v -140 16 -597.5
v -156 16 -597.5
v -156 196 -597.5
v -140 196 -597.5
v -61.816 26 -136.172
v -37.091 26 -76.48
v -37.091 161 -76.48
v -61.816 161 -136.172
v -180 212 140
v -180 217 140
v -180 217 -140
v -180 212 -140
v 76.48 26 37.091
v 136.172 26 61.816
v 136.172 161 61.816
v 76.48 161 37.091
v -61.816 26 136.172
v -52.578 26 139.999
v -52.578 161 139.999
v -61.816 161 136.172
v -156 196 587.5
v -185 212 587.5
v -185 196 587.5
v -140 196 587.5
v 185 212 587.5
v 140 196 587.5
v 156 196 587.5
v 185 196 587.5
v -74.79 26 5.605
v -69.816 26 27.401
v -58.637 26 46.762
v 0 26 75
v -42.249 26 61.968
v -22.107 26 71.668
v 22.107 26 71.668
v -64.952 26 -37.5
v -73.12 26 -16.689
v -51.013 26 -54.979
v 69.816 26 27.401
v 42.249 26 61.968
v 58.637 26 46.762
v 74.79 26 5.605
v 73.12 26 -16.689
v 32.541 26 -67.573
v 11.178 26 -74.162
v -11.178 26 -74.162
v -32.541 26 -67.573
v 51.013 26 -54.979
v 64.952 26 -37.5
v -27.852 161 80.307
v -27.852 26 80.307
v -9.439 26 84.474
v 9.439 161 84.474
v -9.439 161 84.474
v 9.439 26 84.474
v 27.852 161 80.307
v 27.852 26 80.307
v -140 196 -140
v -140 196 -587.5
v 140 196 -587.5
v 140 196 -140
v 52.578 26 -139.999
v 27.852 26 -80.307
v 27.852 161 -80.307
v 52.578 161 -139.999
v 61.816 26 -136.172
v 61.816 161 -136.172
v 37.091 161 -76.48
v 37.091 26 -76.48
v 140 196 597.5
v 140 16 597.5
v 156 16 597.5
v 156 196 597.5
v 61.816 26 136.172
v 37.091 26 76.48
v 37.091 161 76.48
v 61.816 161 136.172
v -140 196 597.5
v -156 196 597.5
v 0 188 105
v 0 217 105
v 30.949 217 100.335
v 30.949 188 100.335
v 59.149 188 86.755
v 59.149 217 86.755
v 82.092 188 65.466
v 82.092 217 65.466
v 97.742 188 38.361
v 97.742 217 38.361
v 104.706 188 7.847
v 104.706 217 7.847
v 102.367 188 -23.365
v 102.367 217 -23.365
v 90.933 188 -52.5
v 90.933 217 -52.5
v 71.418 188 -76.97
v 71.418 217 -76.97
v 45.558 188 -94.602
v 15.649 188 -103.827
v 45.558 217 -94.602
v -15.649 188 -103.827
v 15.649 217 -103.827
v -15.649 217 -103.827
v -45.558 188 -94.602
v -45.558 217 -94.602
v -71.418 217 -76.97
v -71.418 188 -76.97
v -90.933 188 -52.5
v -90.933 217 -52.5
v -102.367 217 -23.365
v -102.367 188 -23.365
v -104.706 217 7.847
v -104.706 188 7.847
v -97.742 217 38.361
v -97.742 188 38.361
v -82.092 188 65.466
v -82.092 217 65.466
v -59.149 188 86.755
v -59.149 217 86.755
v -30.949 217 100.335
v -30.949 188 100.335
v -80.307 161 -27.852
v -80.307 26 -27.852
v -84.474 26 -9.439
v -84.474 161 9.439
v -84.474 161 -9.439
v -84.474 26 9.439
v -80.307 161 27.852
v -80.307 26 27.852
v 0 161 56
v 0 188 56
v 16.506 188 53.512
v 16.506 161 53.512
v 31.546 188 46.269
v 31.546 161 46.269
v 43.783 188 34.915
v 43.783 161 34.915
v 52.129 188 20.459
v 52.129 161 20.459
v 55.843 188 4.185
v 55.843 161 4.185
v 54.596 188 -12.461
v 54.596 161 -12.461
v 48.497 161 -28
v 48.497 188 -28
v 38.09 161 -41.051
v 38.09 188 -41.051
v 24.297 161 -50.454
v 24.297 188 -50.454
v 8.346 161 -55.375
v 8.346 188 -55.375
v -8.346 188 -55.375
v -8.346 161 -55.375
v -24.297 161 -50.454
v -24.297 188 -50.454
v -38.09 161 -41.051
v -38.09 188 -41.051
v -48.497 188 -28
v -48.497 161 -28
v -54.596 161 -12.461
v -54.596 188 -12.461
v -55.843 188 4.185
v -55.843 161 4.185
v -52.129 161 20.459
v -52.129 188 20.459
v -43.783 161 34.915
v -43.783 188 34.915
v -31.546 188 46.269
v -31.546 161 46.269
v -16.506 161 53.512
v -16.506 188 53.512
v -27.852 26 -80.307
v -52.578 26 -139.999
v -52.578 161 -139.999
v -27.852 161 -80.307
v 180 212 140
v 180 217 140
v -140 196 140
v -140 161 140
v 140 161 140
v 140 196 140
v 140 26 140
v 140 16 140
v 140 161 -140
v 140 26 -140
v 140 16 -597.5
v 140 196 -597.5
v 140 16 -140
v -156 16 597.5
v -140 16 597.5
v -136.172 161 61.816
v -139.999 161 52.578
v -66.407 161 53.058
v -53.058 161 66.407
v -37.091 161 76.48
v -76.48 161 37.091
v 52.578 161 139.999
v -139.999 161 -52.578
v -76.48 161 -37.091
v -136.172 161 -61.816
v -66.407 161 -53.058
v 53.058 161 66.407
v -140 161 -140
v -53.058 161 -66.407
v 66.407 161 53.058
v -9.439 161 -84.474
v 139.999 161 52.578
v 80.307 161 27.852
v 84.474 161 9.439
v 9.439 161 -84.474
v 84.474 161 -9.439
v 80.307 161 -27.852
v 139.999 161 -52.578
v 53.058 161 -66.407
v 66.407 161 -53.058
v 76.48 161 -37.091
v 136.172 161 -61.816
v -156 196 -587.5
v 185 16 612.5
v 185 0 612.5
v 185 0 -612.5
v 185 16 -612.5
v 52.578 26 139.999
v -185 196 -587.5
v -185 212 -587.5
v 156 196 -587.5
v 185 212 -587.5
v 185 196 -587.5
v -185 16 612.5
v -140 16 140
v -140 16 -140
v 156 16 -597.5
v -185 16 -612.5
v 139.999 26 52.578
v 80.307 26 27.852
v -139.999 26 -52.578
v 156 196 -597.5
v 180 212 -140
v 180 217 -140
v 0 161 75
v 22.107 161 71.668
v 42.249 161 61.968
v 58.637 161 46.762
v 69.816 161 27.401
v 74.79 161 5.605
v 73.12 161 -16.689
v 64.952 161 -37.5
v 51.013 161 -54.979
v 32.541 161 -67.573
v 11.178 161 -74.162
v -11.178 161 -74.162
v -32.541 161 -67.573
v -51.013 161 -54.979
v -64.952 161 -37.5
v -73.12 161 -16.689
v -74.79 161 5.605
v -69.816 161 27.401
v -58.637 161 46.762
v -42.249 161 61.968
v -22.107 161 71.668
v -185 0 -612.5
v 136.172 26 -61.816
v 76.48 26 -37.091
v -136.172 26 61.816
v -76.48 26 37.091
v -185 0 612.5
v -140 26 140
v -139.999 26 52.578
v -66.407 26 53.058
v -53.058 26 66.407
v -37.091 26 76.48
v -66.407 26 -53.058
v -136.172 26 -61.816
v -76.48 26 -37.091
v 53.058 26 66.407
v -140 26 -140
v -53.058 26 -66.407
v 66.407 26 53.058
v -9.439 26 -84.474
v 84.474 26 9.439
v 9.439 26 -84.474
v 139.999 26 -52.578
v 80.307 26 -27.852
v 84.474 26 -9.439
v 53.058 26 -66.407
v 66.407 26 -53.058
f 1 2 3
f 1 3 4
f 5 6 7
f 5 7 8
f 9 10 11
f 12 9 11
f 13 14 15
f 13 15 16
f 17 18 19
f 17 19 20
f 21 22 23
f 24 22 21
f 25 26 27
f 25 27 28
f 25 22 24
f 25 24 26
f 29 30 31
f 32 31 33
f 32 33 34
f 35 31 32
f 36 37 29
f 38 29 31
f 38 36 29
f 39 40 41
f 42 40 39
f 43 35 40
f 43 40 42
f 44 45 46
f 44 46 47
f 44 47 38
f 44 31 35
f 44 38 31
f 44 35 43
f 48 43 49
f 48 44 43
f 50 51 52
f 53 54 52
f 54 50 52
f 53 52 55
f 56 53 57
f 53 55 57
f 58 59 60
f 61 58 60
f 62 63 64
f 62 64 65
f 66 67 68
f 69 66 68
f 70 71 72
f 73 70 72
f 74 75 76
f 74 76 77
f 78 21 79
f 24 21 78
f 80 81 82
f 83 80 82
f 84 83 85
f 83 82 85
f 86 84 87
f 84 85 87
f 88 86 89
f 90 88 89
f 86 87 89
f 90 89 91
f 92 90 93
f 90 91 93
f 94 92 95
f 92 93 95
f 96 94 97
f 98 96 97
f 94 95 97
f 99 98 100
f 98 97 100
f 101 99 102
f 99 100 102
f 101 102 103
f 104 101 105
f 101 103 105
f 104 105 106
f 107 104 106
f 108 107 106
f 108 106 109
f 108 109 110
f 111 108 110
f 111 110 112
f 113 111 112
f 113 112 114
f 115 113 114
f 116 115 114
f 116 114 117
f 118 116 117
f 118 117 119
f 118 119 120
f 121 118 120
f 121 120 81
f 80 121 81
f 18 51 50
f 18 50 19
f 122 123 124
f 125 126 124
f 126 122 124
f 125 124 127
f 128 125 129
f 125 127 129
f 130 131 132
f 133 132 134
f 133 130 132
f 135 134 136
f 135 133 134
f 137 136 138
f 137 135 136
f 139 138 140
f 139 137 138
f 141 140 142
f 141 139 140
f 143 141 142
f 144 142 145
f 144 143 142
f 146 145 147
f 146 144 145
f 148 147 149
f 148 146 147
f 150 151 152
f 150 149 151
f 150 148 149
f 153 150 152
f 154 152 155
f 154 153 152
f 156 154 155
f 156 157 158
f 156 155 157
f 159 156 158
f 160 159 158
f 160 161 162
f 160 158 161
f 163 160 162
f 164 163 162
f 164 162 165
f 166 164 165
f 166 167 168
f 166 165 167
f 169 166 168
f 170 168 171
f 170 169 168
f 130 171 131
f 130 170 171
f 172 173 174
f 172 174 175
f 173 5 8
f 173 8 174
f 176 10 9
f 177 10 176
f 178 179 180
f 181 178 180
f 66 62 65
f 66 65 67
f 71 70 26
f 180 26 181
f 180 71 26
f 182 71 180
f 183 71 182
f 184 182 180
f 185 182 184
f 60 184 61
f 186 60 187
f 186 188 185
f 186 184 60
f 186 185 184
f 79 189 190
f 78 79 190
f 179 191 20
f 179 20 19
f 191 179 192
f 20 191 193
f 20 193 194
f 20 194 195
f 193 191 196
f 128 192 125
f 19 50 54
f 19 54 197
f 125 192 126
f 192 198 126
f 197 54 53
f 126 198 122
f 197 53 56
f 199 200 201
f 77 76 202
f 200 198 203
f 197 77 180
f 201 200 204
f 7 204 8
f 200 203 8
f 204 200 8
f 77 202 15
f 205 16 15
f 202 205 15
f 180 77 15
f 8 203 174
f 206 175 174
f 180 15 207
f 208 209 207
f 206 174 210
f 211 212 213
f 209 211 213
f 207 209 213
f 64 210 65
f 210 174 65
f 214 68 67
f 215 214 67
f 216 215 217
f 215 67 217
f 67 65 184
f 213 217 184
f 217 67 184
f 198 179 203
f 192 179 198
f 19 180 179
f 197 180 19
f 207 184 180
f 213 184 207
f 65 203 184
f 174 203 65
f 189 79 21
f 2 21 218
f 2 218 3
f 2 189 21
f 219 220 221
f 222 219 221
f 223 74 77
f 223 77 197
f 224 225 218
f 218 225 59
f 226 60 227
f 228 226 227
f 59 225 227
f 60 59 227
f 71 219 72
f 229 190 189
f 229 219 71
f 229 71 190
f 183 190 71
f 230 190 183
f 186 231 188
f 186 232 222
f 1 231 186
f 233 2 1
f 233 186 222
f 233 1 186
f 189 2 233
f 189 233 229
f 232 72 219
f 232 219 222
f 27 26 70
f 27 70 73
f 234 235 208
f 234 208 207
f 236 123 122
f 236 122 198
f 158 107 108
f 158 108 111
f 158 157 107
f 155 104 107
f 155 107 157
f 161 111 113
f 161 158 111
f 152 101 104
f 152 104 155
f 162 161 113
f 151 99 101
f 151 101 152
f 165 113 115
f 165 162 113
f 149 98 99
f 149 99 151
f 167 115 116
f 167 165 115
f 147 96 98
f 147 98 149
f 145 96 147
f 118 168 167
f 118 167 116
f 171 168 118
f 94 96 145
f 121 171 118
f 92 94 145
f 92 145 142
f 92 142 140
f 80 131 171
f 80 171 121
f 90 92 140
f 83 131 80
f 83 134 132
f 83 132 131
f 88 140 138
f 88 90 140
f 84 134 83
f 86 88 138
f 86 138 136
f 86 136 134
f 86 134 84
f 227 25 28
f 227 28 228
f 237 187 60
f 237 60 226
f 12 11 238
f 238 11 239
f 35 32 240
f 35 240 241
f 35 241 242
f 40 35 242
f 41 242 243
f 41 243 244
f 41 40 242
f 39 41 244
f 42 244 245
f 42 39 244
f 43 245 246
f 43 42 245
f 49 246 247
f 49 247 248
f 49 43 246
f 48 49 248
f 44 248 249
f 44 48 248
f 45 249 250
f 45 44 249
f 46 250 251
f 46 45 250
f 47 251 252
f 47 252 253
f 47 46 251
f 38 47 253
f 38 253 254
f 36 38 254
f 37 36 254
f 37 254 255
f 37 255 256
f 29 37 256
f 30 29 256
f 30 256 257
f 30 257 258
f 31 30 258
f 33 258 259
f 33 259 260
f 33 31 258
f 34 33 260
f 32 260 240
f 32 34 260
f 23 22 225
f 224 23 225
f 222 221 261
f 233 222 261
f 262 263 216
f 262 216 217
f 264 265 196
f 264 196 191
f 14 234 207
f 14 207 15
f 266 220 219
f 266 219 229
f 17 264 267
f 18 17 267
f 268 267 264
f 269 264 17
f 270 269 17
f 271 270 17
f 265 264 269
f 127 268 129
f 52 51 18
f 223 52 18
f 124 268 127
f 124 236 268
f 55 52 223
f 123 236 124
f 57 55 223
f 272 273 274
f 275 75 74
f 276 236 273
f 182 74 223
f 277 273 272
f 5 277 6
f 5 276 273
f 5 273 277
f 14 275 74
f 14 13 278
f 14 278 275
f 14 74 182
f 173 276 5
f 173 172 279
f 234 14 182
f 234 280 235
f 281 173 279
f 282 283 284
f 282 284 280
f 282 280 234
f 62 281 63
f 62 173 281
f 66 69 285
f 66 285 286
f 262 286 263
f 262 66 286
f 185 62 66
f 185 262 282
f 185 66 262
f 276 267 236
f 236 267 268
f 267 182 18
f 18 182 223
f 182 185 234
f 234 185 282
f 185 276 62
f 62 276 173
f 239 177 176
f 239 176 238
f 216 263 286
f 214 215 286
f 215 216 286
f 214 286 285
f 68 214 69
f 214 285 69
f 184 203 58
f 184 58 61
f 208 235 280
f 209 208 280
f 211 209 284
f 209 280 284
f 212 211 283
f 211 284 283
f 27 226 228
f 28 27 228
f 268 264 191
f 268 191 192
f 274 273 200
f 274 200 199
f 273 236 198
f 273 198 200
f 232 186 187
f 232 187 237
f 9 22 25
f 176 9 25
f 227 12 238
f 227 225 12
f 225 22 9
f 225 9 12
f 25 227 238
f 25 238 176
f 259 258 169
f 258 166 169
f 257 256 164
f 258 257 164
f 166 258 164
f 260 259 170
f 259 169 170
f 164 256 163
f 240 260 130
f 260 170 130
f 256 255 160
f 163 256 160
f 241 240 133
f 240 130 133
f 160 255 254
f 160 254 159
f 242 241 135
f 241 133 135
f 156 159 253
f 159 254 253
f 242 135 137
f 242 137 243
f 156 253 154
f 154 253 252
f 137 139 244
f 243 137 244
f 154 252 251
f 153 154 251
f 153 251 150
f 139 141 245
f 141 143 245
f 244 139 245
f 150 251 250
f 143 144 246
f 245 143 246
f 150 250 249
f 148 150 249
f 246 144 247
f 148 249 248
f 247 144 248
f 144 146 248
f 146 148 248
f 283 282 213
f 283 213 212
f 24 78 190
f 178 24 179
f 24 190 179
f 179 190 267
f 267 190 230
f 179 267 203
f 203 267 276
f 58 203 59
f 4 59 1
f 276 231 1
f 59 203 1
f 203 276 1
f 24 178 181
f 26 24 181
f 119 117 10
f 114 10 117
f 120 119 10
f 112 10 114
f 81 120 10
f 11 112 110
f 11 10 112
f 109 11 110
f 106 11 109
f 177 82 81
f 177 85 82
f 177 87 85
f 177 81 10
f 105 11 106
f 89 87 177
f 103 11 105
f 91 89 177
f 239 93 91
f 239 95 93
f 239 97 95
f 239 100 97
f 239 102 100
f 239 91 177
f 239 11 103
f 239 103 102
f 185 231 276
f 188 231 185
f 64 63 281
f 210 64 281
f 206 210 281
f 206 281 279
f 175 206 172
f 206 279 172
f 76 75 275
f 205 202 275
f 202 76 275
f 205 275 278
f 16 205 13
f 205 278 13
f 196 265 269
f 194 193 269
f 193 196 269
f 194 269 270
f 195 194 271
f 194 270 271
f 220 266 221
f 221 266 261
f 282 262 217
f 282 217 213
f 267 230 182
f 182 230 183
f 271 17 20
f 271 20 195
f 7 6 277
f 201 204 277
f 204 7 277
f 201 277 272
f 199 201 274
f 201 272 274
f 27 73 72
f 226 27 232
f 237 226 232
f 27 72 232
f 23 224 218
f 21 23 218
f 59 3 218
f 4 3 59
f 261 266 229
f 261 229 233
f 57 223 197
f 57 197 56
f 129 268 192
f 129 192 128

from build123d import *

# Parameters (mm, degrees)
SKETCH_1_W               = 1225
SKETCH_1_H               = 370
EXTRUDE_1_DEPTH          = 16
SKETCH_2_W               = 280
SKETCH_2_H               = 280
EXTRUDE_2_DEPTH          = 10
SKETCH_3_R               = 85
SKETCH_3_R_2             = 75
EXTRUDE_3_DEPTH          = 135
EXTRUDE_4_DEPTH          = 135
PATTERN_CIRCULAR_1_COUNT = 8
SKETCH_5_W               = 280
SKETCH_5_H               = 280
SKETCH_5_R               = 56
EXTRUDE_5_DEPTH          = 35
SKETCH_6_R               = 105
CUT_EXTRUDE_1_DEPTH      = 8
SKETCH_7_W               = 16
SKETCH_7_H               = 1195
EXTRUDE_8_DEPTH          = 180
EXTRUDE_START            = 16
SKETCH_8_W               = 370
SKETCH_8_H               = 1175
SKETCH_8_R               = 105
EXTRUDE_9_DEPTH          = 16
EXTRUDE_START_2          = 5
SKETCH_9_W               = 360
SKETCH_9_H               = 280
SKETCH_9_R               = 105
EXTRUDE_10_DEPTH         = 5


with BuildPart() as part:
    # 草图1 → 凸台-拉伸1 (new body)
    with BuildSketch(Plane(origin=(0, 0, 0), x_dir=(0, 0, -1), z_dir=(0, 1, 0))):
        Rectangle(SKETCH_1_W, SKETCH_1_H)
    extrude(amount=EXTRUDE_1_DEPTH)

    # 草图2 → 凸台-拉伸2 (add)
    with BuildSketch(Plane(origin=(0, 16, 0), x_dir=(1, 0, 0), z_dir=(0, 1, 0))):
        Rectangle(SKETCH_2_W, SKETCH_2_H)
    extrude(amount=EXTRUDE_2_DEPTH)

    # 草图3 → 凸台-拉伸3 (add)
    with BuildSketch(Plane(origin=(0, 26, 0), x_dir=(1, 0, 0), z_dir=(0, 1, 0))):
        with Locations(Location((0, 0, 0), (0, 0, 270))):
            Circle(SKETCH_3_R)
        with Locations(Location((0, 0, 0), (0, 0, 270))):
            Circle(SKETCH_3_R_2, mode=Mode.SUBTRACT)
    extrude(amount=EXTRUDE_3_DEPTH)

    # 草图4 → 凸台-拉伸4 (add)
    with BuildSketch(Plane(origin=(0, 26, 0), x_dir=(1, 0, 0), z_dir=(0, 1, 0))):
        with BuildLine():
            Line((27.852368346, 80.307195054), (52.577523517, 139.999))
            Line((52.577523517, 139.999), (61.816318842, 136.172165676))
            Line((61.816318842, 136.172165676), (37.091163671, 76.480360731))
            ThreePointArc((37.091163671, 76.480360731), (32.528091751, 78.529760263), (27.852368346, 80.307195054))
        make_face()
    extrude_4 = extrude(amount=EXTRUDE_4_DEPTH)

    # 阵列(圆周)1: 凸台-拉伸4 ×8 about axis
    pattern_circular_1_axis = Axis((0, 0, 0), (0, 1, 0))
    for i in range(1, PATTERN_CIRCULAR_1_COUNT):
        add(extrude_4.rotate(pattern_circular_1_axis, i * 360 / PATTERN_CIRCULAR_1_COUNT))

    # 草图5 → 凸台-拉伸5 (add)
    with BuildSketch(Plane(origin=(0, 161, 0), x_dir=(1, 0, 0), z_dir=(0, 1, 0))):
        Rectangle(SKETCH_5_W, SKETCH_5_H)
        with Locations(Location((0, 0, 0), (0, 0, 270))):
            Circle(SKETCH_5_R, mode=Mode.SUBTRACT)
    extrude(amount=EXTRUDE_5_DEPTH)

    # 草图6 → 切除-拉伸1 (cut)
    with BuildSketch(Plane(origin=(0, 196, 0), x_dir=(1, 0, 0), z_dir=(0, 1, 0))):
        with Locations(Location((0, 0, 0), (0, 0, 270))):
            Circle(SKETCH_6_R)
    extrude(amount=-CUT_EXTRUDE_1_DEPTH, mode=Mode.SUBTRACT)

    # 草图7 → 凸台-拉伸8 (add)
    with BuildSketch(Plane(origin=(0, 16, 0), x_dir=(1, 0, 0), z_dir=(0, 1, 0))):
        with Locations((-148, 0)):
            Rectangle(SKETCH_7_W, SKETCH_7_H)
        with Locations((148, 0)):
            Rectangle(SKETCH_7_W, SKETCH_7_H)
    extrude(amount=EXTRUDE_8_DEPTH)

    # 草图8 → 凸台-拉伸9 (add)
    with BuildSketch(Plane(origin=(0, 196, 0), x_dir=(1, 0, 0), z_dir=(0, 1, 0)).offset(EXTRUDE_START)):
        Rectangle(SKETCH_8_W, SKETCH_8_H)
        with Locations(Location((0, 0, 0), (0, 0, 270))):
            Circle(SKETCH_8_R, mode=Mode.SUBTRACT)
    extrude(amount=-EXTRUDE_9_DEPTH)

    # 草图9 → 凸台-拉伸10 (add)
    with BuildSketch(Plane(origin=(0, 212, 0), x_dir=(1, 0, 0), z_dir=(0, 1, 0)).offset(EXTRUDE_START_2)):
        Rectangle(SKETCH_9_W, SKETCH_9_H)
        with Locations(Location((0, 0, 0), (0, 0, 270))):
            Circle(SKETCH_9_R, mode=Mode.SUBTRACT)
    extrude(amount=-EXTRUDE_10_DEPTH)


solid = part.part
